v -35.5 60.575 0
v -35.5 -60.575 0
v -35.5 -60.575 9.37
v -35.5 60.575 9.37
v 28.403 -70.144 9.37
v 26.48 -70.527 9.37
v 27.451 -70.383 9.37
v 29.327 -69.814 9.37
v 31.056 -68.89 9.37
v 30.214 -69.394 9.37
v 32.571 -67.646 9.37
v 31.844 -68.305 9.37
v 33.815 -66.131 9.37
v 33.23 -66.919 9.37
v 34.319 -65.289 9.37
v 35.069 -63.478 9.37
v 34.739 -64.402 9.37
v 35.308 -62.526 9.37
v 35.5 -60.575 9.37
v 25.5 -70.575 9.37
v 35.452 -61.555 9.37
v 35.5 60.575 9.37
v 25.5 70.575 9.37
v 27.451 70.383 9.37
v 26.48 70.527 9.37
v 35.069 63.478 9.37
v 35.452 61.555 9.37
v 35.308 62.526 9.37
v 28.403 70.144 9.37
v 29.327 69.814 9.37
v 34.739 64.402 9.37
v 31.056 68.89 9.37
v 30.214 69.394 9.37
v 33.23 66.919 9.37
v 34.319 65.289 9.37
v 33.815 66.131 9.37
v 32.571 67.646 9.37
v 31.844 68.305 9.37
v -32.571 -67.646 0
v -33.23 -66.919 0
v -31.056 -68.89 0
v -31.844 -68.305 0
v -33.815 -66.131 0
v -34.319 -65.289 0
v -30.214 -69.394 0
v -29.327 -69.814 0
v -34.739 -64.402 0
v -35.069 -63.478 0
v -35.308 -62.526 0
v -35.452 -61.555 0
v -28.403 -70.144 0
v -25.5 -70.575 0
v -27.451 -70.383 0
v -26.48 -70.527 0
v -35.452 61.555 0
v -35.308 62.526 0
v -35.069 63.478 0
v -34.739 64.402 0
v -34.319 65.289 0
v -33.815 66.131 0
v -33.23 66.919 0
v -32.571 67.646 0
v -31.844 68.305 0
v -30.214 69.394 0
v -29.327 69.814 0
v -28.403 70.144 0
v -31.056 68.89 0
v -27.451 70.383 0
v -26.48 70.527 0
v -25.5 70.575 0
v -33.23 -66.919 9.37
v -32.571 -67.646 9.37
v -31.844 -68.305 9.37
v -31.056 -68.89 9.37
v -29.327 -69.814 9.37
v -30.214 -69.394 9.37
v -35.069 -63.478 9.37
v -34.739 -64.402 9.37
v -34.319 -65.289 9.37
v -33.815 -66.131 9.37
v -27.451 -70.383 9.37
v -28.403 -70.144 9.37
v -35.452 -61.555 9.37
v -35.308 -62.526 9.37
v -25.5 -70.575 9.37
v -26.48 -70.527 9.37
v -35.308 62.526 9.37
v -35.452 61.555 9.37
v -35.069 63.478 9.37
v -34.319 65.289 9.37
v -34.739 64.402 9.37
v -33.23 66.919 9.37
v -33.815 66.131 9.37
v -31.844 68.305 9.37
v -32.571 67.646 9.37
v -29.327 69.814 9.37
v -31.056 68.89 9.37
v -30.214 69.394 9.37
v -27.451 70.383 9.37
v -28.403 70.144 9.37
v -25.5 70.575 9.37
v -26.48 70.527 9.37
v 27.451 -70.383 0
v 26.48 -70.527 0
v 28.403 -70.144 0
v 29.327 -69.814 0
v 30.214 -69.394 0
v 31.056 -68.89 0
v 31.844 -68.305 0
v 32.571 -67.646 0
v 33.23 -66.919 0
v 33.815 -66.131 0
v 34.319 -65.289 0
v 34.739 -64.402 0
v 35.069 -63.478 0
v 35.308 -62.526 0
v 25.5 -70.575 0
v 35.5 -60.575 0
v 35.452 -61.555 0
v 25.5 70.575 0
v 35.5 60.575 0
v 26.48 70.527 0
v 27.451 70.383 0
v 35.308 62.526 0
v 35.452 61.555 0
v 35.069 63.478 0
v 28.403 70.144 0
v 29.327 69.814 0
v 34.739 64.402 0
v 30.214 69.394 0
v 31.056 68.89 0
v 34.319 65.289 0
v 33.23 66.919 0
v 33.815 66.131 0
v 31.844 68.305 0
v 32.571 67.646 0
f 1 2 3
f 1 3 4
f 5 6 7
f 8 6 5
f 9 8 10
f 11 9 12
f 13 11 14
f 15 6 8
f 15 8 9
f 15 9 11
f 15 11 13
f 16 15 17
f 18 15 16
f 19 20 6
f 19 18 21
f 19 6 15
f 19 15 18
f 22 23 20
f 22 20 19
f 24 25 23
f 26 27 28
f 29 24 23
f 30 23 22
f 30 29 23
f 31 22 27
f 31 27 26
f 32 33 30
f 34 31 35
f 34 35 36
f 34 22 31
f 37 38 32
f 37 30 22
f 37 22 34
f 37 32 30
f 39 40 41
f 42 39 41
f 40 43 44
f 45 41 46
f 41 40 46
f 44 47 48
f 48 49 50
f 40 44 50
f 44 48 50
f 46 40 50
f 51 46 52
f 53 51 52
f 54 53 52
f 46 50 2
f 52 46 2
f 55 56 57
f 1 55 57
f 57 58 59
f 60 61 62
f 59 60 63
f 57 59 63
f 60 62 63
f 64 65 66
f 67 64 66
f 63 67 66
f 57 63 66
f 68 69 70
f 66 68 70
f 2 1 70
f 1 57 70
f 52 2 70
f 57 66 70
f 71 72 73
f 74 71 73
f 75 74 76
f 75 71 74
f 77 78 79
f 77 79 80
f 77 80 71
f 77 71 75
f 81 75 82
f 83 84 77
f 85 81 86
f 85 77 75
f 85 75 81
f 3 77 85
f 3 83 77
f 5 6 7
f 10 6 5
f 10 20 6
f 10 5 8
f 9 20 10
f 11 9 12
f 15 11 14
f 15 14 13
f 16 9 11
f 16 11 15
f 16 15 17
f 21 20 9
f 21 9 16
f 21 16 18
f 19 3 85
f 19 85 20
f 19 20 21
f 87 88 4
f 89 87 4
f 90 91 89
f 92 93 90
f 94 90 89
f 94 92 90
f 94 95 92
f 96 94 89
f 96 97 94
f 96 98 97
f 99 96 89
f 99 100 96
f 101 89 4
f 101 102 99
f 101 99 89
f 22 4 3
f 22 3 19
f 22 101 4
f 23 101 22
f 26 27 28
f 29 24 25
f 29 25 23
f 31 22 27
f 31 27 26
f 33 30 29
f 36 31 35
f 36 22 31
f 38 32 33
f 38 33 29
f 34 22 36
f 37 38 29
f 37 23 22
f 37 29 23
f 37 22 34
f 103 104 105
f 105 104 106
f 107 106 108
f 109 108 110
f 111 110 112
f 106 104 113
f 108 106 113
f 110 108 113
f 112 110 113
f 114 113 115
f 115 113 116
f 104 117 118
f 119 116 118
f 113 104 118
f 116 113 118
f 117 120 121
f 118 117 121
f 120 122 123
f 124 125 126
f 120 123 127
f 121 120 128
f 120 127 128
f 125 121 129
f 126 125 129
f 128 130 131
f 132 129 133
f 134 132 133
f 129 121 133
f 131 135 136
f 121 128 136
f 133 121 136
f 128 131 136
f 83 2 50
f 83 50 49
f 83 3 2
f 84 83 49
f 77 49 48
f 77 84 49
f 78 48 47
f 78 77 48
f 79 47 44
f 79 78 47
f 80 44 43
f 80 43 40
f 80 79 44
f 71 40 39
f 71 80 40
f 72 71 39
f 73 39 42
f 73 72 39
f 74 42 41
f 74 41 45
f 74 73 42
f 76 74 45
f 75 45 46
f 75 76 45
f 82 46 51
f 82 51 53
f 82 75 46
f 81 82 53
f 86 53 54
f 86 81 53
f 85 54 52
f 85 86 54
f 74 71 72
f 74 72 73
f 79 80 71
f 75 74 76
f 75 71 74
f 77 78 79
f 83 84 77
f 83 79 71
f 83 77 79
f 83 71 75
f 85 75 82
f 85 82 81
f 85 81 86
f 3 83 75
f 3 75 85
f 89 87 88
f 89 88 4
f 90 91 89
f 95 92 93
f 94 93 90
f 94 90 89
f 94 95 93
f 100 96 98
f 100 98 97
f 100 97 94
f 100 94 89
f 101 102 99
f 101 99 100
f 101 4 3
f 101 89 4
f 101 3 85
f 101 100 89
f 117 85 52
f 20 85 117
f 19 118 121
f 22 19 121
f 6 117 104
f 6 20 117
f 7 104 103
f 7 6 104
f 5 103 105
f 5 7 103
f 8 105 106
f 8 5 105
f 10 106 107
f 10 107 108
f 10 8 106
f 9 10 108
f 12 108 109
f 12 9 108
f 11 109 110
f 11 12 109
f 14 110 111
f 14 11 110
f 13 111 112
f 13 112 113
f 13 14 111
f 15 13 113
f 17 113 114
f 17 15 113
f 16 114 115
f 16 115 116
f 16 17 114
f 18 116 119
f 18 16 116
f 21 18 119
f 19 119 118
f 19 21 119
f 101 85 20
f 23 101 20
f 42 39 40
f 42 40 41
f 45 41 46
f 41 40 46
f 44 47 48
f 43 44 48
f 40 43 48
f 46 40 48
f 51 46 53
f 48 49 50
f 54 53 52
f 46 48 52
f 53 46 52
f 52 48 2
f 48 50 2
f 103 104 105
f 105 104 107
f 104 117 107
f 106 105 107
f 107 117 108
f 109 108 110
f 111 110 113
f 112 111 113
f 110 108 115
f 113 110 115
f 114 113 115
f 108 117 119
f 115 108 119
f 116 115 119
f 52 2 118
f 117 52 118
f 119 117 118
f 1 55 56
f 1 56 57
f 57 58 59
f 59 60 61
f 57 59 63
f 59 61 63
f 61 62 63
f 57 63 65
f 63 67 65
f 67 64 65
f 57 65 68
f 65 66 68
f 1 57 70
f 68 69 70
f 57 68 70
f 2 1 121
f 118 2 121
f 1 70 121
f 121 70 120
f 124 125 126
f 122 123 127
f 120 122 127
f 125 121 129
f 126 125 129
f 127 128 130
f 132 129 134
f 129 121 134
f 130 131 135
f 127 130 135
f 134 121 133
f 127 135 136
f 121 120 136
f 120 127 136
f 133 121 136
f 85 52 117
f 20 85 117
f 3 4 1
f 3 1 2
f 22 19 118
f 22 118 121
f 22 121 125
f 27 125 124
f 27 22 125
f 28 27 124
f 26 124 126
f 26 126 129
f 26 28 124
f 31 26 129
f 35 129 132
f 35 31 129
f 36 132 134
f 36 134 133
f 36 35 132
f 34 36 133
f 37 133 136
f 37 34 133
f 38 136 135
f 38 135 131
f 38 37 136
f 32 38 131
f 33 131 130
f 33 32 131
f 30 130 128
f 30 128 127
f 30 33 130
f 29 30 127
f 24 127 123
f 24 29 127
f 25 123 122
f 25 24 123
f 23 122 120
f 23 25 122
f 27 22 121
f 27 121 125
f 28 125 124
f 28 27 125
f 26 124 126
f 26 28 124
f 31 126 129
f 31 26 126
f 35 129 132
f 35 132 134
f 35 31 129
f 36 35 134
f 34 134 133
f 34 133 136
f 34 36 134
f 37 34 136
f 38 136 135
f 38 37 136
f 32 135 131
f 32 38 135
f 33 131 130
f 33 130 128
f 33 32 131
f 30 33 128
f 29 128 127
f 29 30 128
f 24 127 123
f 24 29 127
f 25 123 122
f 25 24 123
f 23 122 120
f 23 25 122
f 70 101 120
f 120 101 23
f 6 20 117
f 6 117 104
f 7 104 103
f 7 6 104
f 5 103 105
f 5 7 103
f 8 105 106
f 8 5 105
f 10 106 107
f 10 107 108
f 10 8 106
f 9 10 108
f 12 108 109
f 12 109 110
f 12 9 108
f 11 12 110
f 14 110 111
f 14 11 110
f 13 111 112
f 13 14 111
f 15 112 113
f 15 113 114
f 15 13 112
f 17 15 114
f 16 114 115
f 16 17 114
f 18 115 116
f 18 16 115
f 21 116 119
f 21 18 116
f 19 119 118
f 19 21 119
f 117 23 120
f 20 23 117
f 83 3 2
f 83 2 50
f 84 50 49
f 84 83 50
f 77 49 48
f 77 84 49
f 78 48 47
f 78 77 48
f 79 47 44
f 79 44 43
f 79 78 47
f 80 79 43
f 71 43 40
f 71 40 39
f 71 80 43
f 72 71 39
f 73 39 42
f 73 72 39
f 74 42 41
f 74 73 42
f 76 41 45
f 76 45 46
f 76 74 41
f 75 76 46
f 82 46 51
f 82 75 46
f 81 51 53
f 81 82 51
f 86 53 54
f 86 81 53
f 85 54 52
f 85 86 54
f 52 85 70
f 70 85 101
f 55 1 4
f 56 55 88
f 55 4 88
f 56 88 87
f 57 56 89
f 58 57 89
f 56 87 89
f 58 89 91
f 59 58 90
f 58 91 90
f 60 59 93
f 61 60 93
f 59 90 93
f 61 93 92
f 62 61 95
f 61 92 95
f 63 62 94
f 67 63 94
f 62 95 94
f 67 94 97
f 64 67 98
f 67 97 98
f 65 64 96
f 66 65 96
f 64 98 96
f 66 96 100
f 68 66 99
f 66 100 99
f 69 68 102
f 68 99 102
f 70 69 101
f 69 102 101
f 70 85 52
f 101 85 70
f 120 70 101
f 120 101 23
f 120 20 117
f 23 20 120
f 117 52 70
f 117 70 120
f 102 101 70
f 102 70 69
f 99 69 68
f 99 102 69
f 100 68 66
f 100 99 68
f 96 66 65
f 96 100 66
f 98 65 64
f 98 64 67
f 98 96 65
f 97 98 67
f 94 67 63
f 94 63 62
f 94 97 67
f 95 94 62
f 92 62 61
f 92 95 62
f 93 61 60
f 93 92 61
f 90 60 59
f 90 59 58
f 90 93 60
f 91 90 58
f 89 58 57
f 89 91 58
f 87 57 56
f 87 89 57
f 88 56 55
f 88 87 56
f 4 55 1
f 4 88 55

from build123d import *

# Parameters (mm, degrees)
F0_W     = 71
F0_H     = 141.15
F1_DEPTH = 9.37
F2_R     = 10
F4_DEPTH = 9.37
F3_W     = 51
F3_H     = 141.15
F5_DEPTH = 9.37


with BuildPart() as f1:
    # F0 (on Top) → F1 (new body)
    with BuildSketch(Plane.XY):
        Rectangle(F0_W, F0_H)
    extrude(amount=F1_DEPTH)

    # F2
    f2_edges = [f1.edges().sort_by_distance(p)[0] for p in [
        (35.5, -70.575, 4.685),
        (-35.5, -70.575, 4.685),
        (35.5, 70.575, 4.685),
        (-35.5, 70.575, 4.685),
    ]]
    fillet(f2_edges, radius=F2_R)


with BuildPart() as f4:
    # F3 (on face) → F4 (new body)
    with BuildSketch(Plane.XY.offset(9.37)):
        with BuildLine():
            Line((-25.5, -70.575), (-25.5, 70.575))
            ThreePointArc((-25.5, 70.575), (-32.571068, 67.646068), (-35.5, 60.575))
            Line((-35.5, 60.575), (-35.5, -60.575))
            ThreePointArc((-35.5, -60.575), (-32.571068, -67.646068), (-25.5, -70.575))
        make_face()
        with BuildLine():
            ThreePointArc((35.5, 60.575), (32.571068, 67.646068), (25.5, 70.575))
            Line((25.5, 70.575), (25.5, -70.575))
            ThreePointArc((25.5, -70.575), (32.571068, -67.646068), (35.5, -60.575))
            Line((35.5, -60.575), (35.5, 60.575))
        make_face()
    extrude(amount=-F4_DEPTH)


with BuildPart() as f5:
    # F3 (on face) → F5 (new body)
    with BuildSketch(Plane.XY.offset(9.37)):
        Rectangle(F3_W, F3_H)
    extrude(amount=-F5_DEPTH)


solid = Compound([f1.part, f4.part, f5.part])
